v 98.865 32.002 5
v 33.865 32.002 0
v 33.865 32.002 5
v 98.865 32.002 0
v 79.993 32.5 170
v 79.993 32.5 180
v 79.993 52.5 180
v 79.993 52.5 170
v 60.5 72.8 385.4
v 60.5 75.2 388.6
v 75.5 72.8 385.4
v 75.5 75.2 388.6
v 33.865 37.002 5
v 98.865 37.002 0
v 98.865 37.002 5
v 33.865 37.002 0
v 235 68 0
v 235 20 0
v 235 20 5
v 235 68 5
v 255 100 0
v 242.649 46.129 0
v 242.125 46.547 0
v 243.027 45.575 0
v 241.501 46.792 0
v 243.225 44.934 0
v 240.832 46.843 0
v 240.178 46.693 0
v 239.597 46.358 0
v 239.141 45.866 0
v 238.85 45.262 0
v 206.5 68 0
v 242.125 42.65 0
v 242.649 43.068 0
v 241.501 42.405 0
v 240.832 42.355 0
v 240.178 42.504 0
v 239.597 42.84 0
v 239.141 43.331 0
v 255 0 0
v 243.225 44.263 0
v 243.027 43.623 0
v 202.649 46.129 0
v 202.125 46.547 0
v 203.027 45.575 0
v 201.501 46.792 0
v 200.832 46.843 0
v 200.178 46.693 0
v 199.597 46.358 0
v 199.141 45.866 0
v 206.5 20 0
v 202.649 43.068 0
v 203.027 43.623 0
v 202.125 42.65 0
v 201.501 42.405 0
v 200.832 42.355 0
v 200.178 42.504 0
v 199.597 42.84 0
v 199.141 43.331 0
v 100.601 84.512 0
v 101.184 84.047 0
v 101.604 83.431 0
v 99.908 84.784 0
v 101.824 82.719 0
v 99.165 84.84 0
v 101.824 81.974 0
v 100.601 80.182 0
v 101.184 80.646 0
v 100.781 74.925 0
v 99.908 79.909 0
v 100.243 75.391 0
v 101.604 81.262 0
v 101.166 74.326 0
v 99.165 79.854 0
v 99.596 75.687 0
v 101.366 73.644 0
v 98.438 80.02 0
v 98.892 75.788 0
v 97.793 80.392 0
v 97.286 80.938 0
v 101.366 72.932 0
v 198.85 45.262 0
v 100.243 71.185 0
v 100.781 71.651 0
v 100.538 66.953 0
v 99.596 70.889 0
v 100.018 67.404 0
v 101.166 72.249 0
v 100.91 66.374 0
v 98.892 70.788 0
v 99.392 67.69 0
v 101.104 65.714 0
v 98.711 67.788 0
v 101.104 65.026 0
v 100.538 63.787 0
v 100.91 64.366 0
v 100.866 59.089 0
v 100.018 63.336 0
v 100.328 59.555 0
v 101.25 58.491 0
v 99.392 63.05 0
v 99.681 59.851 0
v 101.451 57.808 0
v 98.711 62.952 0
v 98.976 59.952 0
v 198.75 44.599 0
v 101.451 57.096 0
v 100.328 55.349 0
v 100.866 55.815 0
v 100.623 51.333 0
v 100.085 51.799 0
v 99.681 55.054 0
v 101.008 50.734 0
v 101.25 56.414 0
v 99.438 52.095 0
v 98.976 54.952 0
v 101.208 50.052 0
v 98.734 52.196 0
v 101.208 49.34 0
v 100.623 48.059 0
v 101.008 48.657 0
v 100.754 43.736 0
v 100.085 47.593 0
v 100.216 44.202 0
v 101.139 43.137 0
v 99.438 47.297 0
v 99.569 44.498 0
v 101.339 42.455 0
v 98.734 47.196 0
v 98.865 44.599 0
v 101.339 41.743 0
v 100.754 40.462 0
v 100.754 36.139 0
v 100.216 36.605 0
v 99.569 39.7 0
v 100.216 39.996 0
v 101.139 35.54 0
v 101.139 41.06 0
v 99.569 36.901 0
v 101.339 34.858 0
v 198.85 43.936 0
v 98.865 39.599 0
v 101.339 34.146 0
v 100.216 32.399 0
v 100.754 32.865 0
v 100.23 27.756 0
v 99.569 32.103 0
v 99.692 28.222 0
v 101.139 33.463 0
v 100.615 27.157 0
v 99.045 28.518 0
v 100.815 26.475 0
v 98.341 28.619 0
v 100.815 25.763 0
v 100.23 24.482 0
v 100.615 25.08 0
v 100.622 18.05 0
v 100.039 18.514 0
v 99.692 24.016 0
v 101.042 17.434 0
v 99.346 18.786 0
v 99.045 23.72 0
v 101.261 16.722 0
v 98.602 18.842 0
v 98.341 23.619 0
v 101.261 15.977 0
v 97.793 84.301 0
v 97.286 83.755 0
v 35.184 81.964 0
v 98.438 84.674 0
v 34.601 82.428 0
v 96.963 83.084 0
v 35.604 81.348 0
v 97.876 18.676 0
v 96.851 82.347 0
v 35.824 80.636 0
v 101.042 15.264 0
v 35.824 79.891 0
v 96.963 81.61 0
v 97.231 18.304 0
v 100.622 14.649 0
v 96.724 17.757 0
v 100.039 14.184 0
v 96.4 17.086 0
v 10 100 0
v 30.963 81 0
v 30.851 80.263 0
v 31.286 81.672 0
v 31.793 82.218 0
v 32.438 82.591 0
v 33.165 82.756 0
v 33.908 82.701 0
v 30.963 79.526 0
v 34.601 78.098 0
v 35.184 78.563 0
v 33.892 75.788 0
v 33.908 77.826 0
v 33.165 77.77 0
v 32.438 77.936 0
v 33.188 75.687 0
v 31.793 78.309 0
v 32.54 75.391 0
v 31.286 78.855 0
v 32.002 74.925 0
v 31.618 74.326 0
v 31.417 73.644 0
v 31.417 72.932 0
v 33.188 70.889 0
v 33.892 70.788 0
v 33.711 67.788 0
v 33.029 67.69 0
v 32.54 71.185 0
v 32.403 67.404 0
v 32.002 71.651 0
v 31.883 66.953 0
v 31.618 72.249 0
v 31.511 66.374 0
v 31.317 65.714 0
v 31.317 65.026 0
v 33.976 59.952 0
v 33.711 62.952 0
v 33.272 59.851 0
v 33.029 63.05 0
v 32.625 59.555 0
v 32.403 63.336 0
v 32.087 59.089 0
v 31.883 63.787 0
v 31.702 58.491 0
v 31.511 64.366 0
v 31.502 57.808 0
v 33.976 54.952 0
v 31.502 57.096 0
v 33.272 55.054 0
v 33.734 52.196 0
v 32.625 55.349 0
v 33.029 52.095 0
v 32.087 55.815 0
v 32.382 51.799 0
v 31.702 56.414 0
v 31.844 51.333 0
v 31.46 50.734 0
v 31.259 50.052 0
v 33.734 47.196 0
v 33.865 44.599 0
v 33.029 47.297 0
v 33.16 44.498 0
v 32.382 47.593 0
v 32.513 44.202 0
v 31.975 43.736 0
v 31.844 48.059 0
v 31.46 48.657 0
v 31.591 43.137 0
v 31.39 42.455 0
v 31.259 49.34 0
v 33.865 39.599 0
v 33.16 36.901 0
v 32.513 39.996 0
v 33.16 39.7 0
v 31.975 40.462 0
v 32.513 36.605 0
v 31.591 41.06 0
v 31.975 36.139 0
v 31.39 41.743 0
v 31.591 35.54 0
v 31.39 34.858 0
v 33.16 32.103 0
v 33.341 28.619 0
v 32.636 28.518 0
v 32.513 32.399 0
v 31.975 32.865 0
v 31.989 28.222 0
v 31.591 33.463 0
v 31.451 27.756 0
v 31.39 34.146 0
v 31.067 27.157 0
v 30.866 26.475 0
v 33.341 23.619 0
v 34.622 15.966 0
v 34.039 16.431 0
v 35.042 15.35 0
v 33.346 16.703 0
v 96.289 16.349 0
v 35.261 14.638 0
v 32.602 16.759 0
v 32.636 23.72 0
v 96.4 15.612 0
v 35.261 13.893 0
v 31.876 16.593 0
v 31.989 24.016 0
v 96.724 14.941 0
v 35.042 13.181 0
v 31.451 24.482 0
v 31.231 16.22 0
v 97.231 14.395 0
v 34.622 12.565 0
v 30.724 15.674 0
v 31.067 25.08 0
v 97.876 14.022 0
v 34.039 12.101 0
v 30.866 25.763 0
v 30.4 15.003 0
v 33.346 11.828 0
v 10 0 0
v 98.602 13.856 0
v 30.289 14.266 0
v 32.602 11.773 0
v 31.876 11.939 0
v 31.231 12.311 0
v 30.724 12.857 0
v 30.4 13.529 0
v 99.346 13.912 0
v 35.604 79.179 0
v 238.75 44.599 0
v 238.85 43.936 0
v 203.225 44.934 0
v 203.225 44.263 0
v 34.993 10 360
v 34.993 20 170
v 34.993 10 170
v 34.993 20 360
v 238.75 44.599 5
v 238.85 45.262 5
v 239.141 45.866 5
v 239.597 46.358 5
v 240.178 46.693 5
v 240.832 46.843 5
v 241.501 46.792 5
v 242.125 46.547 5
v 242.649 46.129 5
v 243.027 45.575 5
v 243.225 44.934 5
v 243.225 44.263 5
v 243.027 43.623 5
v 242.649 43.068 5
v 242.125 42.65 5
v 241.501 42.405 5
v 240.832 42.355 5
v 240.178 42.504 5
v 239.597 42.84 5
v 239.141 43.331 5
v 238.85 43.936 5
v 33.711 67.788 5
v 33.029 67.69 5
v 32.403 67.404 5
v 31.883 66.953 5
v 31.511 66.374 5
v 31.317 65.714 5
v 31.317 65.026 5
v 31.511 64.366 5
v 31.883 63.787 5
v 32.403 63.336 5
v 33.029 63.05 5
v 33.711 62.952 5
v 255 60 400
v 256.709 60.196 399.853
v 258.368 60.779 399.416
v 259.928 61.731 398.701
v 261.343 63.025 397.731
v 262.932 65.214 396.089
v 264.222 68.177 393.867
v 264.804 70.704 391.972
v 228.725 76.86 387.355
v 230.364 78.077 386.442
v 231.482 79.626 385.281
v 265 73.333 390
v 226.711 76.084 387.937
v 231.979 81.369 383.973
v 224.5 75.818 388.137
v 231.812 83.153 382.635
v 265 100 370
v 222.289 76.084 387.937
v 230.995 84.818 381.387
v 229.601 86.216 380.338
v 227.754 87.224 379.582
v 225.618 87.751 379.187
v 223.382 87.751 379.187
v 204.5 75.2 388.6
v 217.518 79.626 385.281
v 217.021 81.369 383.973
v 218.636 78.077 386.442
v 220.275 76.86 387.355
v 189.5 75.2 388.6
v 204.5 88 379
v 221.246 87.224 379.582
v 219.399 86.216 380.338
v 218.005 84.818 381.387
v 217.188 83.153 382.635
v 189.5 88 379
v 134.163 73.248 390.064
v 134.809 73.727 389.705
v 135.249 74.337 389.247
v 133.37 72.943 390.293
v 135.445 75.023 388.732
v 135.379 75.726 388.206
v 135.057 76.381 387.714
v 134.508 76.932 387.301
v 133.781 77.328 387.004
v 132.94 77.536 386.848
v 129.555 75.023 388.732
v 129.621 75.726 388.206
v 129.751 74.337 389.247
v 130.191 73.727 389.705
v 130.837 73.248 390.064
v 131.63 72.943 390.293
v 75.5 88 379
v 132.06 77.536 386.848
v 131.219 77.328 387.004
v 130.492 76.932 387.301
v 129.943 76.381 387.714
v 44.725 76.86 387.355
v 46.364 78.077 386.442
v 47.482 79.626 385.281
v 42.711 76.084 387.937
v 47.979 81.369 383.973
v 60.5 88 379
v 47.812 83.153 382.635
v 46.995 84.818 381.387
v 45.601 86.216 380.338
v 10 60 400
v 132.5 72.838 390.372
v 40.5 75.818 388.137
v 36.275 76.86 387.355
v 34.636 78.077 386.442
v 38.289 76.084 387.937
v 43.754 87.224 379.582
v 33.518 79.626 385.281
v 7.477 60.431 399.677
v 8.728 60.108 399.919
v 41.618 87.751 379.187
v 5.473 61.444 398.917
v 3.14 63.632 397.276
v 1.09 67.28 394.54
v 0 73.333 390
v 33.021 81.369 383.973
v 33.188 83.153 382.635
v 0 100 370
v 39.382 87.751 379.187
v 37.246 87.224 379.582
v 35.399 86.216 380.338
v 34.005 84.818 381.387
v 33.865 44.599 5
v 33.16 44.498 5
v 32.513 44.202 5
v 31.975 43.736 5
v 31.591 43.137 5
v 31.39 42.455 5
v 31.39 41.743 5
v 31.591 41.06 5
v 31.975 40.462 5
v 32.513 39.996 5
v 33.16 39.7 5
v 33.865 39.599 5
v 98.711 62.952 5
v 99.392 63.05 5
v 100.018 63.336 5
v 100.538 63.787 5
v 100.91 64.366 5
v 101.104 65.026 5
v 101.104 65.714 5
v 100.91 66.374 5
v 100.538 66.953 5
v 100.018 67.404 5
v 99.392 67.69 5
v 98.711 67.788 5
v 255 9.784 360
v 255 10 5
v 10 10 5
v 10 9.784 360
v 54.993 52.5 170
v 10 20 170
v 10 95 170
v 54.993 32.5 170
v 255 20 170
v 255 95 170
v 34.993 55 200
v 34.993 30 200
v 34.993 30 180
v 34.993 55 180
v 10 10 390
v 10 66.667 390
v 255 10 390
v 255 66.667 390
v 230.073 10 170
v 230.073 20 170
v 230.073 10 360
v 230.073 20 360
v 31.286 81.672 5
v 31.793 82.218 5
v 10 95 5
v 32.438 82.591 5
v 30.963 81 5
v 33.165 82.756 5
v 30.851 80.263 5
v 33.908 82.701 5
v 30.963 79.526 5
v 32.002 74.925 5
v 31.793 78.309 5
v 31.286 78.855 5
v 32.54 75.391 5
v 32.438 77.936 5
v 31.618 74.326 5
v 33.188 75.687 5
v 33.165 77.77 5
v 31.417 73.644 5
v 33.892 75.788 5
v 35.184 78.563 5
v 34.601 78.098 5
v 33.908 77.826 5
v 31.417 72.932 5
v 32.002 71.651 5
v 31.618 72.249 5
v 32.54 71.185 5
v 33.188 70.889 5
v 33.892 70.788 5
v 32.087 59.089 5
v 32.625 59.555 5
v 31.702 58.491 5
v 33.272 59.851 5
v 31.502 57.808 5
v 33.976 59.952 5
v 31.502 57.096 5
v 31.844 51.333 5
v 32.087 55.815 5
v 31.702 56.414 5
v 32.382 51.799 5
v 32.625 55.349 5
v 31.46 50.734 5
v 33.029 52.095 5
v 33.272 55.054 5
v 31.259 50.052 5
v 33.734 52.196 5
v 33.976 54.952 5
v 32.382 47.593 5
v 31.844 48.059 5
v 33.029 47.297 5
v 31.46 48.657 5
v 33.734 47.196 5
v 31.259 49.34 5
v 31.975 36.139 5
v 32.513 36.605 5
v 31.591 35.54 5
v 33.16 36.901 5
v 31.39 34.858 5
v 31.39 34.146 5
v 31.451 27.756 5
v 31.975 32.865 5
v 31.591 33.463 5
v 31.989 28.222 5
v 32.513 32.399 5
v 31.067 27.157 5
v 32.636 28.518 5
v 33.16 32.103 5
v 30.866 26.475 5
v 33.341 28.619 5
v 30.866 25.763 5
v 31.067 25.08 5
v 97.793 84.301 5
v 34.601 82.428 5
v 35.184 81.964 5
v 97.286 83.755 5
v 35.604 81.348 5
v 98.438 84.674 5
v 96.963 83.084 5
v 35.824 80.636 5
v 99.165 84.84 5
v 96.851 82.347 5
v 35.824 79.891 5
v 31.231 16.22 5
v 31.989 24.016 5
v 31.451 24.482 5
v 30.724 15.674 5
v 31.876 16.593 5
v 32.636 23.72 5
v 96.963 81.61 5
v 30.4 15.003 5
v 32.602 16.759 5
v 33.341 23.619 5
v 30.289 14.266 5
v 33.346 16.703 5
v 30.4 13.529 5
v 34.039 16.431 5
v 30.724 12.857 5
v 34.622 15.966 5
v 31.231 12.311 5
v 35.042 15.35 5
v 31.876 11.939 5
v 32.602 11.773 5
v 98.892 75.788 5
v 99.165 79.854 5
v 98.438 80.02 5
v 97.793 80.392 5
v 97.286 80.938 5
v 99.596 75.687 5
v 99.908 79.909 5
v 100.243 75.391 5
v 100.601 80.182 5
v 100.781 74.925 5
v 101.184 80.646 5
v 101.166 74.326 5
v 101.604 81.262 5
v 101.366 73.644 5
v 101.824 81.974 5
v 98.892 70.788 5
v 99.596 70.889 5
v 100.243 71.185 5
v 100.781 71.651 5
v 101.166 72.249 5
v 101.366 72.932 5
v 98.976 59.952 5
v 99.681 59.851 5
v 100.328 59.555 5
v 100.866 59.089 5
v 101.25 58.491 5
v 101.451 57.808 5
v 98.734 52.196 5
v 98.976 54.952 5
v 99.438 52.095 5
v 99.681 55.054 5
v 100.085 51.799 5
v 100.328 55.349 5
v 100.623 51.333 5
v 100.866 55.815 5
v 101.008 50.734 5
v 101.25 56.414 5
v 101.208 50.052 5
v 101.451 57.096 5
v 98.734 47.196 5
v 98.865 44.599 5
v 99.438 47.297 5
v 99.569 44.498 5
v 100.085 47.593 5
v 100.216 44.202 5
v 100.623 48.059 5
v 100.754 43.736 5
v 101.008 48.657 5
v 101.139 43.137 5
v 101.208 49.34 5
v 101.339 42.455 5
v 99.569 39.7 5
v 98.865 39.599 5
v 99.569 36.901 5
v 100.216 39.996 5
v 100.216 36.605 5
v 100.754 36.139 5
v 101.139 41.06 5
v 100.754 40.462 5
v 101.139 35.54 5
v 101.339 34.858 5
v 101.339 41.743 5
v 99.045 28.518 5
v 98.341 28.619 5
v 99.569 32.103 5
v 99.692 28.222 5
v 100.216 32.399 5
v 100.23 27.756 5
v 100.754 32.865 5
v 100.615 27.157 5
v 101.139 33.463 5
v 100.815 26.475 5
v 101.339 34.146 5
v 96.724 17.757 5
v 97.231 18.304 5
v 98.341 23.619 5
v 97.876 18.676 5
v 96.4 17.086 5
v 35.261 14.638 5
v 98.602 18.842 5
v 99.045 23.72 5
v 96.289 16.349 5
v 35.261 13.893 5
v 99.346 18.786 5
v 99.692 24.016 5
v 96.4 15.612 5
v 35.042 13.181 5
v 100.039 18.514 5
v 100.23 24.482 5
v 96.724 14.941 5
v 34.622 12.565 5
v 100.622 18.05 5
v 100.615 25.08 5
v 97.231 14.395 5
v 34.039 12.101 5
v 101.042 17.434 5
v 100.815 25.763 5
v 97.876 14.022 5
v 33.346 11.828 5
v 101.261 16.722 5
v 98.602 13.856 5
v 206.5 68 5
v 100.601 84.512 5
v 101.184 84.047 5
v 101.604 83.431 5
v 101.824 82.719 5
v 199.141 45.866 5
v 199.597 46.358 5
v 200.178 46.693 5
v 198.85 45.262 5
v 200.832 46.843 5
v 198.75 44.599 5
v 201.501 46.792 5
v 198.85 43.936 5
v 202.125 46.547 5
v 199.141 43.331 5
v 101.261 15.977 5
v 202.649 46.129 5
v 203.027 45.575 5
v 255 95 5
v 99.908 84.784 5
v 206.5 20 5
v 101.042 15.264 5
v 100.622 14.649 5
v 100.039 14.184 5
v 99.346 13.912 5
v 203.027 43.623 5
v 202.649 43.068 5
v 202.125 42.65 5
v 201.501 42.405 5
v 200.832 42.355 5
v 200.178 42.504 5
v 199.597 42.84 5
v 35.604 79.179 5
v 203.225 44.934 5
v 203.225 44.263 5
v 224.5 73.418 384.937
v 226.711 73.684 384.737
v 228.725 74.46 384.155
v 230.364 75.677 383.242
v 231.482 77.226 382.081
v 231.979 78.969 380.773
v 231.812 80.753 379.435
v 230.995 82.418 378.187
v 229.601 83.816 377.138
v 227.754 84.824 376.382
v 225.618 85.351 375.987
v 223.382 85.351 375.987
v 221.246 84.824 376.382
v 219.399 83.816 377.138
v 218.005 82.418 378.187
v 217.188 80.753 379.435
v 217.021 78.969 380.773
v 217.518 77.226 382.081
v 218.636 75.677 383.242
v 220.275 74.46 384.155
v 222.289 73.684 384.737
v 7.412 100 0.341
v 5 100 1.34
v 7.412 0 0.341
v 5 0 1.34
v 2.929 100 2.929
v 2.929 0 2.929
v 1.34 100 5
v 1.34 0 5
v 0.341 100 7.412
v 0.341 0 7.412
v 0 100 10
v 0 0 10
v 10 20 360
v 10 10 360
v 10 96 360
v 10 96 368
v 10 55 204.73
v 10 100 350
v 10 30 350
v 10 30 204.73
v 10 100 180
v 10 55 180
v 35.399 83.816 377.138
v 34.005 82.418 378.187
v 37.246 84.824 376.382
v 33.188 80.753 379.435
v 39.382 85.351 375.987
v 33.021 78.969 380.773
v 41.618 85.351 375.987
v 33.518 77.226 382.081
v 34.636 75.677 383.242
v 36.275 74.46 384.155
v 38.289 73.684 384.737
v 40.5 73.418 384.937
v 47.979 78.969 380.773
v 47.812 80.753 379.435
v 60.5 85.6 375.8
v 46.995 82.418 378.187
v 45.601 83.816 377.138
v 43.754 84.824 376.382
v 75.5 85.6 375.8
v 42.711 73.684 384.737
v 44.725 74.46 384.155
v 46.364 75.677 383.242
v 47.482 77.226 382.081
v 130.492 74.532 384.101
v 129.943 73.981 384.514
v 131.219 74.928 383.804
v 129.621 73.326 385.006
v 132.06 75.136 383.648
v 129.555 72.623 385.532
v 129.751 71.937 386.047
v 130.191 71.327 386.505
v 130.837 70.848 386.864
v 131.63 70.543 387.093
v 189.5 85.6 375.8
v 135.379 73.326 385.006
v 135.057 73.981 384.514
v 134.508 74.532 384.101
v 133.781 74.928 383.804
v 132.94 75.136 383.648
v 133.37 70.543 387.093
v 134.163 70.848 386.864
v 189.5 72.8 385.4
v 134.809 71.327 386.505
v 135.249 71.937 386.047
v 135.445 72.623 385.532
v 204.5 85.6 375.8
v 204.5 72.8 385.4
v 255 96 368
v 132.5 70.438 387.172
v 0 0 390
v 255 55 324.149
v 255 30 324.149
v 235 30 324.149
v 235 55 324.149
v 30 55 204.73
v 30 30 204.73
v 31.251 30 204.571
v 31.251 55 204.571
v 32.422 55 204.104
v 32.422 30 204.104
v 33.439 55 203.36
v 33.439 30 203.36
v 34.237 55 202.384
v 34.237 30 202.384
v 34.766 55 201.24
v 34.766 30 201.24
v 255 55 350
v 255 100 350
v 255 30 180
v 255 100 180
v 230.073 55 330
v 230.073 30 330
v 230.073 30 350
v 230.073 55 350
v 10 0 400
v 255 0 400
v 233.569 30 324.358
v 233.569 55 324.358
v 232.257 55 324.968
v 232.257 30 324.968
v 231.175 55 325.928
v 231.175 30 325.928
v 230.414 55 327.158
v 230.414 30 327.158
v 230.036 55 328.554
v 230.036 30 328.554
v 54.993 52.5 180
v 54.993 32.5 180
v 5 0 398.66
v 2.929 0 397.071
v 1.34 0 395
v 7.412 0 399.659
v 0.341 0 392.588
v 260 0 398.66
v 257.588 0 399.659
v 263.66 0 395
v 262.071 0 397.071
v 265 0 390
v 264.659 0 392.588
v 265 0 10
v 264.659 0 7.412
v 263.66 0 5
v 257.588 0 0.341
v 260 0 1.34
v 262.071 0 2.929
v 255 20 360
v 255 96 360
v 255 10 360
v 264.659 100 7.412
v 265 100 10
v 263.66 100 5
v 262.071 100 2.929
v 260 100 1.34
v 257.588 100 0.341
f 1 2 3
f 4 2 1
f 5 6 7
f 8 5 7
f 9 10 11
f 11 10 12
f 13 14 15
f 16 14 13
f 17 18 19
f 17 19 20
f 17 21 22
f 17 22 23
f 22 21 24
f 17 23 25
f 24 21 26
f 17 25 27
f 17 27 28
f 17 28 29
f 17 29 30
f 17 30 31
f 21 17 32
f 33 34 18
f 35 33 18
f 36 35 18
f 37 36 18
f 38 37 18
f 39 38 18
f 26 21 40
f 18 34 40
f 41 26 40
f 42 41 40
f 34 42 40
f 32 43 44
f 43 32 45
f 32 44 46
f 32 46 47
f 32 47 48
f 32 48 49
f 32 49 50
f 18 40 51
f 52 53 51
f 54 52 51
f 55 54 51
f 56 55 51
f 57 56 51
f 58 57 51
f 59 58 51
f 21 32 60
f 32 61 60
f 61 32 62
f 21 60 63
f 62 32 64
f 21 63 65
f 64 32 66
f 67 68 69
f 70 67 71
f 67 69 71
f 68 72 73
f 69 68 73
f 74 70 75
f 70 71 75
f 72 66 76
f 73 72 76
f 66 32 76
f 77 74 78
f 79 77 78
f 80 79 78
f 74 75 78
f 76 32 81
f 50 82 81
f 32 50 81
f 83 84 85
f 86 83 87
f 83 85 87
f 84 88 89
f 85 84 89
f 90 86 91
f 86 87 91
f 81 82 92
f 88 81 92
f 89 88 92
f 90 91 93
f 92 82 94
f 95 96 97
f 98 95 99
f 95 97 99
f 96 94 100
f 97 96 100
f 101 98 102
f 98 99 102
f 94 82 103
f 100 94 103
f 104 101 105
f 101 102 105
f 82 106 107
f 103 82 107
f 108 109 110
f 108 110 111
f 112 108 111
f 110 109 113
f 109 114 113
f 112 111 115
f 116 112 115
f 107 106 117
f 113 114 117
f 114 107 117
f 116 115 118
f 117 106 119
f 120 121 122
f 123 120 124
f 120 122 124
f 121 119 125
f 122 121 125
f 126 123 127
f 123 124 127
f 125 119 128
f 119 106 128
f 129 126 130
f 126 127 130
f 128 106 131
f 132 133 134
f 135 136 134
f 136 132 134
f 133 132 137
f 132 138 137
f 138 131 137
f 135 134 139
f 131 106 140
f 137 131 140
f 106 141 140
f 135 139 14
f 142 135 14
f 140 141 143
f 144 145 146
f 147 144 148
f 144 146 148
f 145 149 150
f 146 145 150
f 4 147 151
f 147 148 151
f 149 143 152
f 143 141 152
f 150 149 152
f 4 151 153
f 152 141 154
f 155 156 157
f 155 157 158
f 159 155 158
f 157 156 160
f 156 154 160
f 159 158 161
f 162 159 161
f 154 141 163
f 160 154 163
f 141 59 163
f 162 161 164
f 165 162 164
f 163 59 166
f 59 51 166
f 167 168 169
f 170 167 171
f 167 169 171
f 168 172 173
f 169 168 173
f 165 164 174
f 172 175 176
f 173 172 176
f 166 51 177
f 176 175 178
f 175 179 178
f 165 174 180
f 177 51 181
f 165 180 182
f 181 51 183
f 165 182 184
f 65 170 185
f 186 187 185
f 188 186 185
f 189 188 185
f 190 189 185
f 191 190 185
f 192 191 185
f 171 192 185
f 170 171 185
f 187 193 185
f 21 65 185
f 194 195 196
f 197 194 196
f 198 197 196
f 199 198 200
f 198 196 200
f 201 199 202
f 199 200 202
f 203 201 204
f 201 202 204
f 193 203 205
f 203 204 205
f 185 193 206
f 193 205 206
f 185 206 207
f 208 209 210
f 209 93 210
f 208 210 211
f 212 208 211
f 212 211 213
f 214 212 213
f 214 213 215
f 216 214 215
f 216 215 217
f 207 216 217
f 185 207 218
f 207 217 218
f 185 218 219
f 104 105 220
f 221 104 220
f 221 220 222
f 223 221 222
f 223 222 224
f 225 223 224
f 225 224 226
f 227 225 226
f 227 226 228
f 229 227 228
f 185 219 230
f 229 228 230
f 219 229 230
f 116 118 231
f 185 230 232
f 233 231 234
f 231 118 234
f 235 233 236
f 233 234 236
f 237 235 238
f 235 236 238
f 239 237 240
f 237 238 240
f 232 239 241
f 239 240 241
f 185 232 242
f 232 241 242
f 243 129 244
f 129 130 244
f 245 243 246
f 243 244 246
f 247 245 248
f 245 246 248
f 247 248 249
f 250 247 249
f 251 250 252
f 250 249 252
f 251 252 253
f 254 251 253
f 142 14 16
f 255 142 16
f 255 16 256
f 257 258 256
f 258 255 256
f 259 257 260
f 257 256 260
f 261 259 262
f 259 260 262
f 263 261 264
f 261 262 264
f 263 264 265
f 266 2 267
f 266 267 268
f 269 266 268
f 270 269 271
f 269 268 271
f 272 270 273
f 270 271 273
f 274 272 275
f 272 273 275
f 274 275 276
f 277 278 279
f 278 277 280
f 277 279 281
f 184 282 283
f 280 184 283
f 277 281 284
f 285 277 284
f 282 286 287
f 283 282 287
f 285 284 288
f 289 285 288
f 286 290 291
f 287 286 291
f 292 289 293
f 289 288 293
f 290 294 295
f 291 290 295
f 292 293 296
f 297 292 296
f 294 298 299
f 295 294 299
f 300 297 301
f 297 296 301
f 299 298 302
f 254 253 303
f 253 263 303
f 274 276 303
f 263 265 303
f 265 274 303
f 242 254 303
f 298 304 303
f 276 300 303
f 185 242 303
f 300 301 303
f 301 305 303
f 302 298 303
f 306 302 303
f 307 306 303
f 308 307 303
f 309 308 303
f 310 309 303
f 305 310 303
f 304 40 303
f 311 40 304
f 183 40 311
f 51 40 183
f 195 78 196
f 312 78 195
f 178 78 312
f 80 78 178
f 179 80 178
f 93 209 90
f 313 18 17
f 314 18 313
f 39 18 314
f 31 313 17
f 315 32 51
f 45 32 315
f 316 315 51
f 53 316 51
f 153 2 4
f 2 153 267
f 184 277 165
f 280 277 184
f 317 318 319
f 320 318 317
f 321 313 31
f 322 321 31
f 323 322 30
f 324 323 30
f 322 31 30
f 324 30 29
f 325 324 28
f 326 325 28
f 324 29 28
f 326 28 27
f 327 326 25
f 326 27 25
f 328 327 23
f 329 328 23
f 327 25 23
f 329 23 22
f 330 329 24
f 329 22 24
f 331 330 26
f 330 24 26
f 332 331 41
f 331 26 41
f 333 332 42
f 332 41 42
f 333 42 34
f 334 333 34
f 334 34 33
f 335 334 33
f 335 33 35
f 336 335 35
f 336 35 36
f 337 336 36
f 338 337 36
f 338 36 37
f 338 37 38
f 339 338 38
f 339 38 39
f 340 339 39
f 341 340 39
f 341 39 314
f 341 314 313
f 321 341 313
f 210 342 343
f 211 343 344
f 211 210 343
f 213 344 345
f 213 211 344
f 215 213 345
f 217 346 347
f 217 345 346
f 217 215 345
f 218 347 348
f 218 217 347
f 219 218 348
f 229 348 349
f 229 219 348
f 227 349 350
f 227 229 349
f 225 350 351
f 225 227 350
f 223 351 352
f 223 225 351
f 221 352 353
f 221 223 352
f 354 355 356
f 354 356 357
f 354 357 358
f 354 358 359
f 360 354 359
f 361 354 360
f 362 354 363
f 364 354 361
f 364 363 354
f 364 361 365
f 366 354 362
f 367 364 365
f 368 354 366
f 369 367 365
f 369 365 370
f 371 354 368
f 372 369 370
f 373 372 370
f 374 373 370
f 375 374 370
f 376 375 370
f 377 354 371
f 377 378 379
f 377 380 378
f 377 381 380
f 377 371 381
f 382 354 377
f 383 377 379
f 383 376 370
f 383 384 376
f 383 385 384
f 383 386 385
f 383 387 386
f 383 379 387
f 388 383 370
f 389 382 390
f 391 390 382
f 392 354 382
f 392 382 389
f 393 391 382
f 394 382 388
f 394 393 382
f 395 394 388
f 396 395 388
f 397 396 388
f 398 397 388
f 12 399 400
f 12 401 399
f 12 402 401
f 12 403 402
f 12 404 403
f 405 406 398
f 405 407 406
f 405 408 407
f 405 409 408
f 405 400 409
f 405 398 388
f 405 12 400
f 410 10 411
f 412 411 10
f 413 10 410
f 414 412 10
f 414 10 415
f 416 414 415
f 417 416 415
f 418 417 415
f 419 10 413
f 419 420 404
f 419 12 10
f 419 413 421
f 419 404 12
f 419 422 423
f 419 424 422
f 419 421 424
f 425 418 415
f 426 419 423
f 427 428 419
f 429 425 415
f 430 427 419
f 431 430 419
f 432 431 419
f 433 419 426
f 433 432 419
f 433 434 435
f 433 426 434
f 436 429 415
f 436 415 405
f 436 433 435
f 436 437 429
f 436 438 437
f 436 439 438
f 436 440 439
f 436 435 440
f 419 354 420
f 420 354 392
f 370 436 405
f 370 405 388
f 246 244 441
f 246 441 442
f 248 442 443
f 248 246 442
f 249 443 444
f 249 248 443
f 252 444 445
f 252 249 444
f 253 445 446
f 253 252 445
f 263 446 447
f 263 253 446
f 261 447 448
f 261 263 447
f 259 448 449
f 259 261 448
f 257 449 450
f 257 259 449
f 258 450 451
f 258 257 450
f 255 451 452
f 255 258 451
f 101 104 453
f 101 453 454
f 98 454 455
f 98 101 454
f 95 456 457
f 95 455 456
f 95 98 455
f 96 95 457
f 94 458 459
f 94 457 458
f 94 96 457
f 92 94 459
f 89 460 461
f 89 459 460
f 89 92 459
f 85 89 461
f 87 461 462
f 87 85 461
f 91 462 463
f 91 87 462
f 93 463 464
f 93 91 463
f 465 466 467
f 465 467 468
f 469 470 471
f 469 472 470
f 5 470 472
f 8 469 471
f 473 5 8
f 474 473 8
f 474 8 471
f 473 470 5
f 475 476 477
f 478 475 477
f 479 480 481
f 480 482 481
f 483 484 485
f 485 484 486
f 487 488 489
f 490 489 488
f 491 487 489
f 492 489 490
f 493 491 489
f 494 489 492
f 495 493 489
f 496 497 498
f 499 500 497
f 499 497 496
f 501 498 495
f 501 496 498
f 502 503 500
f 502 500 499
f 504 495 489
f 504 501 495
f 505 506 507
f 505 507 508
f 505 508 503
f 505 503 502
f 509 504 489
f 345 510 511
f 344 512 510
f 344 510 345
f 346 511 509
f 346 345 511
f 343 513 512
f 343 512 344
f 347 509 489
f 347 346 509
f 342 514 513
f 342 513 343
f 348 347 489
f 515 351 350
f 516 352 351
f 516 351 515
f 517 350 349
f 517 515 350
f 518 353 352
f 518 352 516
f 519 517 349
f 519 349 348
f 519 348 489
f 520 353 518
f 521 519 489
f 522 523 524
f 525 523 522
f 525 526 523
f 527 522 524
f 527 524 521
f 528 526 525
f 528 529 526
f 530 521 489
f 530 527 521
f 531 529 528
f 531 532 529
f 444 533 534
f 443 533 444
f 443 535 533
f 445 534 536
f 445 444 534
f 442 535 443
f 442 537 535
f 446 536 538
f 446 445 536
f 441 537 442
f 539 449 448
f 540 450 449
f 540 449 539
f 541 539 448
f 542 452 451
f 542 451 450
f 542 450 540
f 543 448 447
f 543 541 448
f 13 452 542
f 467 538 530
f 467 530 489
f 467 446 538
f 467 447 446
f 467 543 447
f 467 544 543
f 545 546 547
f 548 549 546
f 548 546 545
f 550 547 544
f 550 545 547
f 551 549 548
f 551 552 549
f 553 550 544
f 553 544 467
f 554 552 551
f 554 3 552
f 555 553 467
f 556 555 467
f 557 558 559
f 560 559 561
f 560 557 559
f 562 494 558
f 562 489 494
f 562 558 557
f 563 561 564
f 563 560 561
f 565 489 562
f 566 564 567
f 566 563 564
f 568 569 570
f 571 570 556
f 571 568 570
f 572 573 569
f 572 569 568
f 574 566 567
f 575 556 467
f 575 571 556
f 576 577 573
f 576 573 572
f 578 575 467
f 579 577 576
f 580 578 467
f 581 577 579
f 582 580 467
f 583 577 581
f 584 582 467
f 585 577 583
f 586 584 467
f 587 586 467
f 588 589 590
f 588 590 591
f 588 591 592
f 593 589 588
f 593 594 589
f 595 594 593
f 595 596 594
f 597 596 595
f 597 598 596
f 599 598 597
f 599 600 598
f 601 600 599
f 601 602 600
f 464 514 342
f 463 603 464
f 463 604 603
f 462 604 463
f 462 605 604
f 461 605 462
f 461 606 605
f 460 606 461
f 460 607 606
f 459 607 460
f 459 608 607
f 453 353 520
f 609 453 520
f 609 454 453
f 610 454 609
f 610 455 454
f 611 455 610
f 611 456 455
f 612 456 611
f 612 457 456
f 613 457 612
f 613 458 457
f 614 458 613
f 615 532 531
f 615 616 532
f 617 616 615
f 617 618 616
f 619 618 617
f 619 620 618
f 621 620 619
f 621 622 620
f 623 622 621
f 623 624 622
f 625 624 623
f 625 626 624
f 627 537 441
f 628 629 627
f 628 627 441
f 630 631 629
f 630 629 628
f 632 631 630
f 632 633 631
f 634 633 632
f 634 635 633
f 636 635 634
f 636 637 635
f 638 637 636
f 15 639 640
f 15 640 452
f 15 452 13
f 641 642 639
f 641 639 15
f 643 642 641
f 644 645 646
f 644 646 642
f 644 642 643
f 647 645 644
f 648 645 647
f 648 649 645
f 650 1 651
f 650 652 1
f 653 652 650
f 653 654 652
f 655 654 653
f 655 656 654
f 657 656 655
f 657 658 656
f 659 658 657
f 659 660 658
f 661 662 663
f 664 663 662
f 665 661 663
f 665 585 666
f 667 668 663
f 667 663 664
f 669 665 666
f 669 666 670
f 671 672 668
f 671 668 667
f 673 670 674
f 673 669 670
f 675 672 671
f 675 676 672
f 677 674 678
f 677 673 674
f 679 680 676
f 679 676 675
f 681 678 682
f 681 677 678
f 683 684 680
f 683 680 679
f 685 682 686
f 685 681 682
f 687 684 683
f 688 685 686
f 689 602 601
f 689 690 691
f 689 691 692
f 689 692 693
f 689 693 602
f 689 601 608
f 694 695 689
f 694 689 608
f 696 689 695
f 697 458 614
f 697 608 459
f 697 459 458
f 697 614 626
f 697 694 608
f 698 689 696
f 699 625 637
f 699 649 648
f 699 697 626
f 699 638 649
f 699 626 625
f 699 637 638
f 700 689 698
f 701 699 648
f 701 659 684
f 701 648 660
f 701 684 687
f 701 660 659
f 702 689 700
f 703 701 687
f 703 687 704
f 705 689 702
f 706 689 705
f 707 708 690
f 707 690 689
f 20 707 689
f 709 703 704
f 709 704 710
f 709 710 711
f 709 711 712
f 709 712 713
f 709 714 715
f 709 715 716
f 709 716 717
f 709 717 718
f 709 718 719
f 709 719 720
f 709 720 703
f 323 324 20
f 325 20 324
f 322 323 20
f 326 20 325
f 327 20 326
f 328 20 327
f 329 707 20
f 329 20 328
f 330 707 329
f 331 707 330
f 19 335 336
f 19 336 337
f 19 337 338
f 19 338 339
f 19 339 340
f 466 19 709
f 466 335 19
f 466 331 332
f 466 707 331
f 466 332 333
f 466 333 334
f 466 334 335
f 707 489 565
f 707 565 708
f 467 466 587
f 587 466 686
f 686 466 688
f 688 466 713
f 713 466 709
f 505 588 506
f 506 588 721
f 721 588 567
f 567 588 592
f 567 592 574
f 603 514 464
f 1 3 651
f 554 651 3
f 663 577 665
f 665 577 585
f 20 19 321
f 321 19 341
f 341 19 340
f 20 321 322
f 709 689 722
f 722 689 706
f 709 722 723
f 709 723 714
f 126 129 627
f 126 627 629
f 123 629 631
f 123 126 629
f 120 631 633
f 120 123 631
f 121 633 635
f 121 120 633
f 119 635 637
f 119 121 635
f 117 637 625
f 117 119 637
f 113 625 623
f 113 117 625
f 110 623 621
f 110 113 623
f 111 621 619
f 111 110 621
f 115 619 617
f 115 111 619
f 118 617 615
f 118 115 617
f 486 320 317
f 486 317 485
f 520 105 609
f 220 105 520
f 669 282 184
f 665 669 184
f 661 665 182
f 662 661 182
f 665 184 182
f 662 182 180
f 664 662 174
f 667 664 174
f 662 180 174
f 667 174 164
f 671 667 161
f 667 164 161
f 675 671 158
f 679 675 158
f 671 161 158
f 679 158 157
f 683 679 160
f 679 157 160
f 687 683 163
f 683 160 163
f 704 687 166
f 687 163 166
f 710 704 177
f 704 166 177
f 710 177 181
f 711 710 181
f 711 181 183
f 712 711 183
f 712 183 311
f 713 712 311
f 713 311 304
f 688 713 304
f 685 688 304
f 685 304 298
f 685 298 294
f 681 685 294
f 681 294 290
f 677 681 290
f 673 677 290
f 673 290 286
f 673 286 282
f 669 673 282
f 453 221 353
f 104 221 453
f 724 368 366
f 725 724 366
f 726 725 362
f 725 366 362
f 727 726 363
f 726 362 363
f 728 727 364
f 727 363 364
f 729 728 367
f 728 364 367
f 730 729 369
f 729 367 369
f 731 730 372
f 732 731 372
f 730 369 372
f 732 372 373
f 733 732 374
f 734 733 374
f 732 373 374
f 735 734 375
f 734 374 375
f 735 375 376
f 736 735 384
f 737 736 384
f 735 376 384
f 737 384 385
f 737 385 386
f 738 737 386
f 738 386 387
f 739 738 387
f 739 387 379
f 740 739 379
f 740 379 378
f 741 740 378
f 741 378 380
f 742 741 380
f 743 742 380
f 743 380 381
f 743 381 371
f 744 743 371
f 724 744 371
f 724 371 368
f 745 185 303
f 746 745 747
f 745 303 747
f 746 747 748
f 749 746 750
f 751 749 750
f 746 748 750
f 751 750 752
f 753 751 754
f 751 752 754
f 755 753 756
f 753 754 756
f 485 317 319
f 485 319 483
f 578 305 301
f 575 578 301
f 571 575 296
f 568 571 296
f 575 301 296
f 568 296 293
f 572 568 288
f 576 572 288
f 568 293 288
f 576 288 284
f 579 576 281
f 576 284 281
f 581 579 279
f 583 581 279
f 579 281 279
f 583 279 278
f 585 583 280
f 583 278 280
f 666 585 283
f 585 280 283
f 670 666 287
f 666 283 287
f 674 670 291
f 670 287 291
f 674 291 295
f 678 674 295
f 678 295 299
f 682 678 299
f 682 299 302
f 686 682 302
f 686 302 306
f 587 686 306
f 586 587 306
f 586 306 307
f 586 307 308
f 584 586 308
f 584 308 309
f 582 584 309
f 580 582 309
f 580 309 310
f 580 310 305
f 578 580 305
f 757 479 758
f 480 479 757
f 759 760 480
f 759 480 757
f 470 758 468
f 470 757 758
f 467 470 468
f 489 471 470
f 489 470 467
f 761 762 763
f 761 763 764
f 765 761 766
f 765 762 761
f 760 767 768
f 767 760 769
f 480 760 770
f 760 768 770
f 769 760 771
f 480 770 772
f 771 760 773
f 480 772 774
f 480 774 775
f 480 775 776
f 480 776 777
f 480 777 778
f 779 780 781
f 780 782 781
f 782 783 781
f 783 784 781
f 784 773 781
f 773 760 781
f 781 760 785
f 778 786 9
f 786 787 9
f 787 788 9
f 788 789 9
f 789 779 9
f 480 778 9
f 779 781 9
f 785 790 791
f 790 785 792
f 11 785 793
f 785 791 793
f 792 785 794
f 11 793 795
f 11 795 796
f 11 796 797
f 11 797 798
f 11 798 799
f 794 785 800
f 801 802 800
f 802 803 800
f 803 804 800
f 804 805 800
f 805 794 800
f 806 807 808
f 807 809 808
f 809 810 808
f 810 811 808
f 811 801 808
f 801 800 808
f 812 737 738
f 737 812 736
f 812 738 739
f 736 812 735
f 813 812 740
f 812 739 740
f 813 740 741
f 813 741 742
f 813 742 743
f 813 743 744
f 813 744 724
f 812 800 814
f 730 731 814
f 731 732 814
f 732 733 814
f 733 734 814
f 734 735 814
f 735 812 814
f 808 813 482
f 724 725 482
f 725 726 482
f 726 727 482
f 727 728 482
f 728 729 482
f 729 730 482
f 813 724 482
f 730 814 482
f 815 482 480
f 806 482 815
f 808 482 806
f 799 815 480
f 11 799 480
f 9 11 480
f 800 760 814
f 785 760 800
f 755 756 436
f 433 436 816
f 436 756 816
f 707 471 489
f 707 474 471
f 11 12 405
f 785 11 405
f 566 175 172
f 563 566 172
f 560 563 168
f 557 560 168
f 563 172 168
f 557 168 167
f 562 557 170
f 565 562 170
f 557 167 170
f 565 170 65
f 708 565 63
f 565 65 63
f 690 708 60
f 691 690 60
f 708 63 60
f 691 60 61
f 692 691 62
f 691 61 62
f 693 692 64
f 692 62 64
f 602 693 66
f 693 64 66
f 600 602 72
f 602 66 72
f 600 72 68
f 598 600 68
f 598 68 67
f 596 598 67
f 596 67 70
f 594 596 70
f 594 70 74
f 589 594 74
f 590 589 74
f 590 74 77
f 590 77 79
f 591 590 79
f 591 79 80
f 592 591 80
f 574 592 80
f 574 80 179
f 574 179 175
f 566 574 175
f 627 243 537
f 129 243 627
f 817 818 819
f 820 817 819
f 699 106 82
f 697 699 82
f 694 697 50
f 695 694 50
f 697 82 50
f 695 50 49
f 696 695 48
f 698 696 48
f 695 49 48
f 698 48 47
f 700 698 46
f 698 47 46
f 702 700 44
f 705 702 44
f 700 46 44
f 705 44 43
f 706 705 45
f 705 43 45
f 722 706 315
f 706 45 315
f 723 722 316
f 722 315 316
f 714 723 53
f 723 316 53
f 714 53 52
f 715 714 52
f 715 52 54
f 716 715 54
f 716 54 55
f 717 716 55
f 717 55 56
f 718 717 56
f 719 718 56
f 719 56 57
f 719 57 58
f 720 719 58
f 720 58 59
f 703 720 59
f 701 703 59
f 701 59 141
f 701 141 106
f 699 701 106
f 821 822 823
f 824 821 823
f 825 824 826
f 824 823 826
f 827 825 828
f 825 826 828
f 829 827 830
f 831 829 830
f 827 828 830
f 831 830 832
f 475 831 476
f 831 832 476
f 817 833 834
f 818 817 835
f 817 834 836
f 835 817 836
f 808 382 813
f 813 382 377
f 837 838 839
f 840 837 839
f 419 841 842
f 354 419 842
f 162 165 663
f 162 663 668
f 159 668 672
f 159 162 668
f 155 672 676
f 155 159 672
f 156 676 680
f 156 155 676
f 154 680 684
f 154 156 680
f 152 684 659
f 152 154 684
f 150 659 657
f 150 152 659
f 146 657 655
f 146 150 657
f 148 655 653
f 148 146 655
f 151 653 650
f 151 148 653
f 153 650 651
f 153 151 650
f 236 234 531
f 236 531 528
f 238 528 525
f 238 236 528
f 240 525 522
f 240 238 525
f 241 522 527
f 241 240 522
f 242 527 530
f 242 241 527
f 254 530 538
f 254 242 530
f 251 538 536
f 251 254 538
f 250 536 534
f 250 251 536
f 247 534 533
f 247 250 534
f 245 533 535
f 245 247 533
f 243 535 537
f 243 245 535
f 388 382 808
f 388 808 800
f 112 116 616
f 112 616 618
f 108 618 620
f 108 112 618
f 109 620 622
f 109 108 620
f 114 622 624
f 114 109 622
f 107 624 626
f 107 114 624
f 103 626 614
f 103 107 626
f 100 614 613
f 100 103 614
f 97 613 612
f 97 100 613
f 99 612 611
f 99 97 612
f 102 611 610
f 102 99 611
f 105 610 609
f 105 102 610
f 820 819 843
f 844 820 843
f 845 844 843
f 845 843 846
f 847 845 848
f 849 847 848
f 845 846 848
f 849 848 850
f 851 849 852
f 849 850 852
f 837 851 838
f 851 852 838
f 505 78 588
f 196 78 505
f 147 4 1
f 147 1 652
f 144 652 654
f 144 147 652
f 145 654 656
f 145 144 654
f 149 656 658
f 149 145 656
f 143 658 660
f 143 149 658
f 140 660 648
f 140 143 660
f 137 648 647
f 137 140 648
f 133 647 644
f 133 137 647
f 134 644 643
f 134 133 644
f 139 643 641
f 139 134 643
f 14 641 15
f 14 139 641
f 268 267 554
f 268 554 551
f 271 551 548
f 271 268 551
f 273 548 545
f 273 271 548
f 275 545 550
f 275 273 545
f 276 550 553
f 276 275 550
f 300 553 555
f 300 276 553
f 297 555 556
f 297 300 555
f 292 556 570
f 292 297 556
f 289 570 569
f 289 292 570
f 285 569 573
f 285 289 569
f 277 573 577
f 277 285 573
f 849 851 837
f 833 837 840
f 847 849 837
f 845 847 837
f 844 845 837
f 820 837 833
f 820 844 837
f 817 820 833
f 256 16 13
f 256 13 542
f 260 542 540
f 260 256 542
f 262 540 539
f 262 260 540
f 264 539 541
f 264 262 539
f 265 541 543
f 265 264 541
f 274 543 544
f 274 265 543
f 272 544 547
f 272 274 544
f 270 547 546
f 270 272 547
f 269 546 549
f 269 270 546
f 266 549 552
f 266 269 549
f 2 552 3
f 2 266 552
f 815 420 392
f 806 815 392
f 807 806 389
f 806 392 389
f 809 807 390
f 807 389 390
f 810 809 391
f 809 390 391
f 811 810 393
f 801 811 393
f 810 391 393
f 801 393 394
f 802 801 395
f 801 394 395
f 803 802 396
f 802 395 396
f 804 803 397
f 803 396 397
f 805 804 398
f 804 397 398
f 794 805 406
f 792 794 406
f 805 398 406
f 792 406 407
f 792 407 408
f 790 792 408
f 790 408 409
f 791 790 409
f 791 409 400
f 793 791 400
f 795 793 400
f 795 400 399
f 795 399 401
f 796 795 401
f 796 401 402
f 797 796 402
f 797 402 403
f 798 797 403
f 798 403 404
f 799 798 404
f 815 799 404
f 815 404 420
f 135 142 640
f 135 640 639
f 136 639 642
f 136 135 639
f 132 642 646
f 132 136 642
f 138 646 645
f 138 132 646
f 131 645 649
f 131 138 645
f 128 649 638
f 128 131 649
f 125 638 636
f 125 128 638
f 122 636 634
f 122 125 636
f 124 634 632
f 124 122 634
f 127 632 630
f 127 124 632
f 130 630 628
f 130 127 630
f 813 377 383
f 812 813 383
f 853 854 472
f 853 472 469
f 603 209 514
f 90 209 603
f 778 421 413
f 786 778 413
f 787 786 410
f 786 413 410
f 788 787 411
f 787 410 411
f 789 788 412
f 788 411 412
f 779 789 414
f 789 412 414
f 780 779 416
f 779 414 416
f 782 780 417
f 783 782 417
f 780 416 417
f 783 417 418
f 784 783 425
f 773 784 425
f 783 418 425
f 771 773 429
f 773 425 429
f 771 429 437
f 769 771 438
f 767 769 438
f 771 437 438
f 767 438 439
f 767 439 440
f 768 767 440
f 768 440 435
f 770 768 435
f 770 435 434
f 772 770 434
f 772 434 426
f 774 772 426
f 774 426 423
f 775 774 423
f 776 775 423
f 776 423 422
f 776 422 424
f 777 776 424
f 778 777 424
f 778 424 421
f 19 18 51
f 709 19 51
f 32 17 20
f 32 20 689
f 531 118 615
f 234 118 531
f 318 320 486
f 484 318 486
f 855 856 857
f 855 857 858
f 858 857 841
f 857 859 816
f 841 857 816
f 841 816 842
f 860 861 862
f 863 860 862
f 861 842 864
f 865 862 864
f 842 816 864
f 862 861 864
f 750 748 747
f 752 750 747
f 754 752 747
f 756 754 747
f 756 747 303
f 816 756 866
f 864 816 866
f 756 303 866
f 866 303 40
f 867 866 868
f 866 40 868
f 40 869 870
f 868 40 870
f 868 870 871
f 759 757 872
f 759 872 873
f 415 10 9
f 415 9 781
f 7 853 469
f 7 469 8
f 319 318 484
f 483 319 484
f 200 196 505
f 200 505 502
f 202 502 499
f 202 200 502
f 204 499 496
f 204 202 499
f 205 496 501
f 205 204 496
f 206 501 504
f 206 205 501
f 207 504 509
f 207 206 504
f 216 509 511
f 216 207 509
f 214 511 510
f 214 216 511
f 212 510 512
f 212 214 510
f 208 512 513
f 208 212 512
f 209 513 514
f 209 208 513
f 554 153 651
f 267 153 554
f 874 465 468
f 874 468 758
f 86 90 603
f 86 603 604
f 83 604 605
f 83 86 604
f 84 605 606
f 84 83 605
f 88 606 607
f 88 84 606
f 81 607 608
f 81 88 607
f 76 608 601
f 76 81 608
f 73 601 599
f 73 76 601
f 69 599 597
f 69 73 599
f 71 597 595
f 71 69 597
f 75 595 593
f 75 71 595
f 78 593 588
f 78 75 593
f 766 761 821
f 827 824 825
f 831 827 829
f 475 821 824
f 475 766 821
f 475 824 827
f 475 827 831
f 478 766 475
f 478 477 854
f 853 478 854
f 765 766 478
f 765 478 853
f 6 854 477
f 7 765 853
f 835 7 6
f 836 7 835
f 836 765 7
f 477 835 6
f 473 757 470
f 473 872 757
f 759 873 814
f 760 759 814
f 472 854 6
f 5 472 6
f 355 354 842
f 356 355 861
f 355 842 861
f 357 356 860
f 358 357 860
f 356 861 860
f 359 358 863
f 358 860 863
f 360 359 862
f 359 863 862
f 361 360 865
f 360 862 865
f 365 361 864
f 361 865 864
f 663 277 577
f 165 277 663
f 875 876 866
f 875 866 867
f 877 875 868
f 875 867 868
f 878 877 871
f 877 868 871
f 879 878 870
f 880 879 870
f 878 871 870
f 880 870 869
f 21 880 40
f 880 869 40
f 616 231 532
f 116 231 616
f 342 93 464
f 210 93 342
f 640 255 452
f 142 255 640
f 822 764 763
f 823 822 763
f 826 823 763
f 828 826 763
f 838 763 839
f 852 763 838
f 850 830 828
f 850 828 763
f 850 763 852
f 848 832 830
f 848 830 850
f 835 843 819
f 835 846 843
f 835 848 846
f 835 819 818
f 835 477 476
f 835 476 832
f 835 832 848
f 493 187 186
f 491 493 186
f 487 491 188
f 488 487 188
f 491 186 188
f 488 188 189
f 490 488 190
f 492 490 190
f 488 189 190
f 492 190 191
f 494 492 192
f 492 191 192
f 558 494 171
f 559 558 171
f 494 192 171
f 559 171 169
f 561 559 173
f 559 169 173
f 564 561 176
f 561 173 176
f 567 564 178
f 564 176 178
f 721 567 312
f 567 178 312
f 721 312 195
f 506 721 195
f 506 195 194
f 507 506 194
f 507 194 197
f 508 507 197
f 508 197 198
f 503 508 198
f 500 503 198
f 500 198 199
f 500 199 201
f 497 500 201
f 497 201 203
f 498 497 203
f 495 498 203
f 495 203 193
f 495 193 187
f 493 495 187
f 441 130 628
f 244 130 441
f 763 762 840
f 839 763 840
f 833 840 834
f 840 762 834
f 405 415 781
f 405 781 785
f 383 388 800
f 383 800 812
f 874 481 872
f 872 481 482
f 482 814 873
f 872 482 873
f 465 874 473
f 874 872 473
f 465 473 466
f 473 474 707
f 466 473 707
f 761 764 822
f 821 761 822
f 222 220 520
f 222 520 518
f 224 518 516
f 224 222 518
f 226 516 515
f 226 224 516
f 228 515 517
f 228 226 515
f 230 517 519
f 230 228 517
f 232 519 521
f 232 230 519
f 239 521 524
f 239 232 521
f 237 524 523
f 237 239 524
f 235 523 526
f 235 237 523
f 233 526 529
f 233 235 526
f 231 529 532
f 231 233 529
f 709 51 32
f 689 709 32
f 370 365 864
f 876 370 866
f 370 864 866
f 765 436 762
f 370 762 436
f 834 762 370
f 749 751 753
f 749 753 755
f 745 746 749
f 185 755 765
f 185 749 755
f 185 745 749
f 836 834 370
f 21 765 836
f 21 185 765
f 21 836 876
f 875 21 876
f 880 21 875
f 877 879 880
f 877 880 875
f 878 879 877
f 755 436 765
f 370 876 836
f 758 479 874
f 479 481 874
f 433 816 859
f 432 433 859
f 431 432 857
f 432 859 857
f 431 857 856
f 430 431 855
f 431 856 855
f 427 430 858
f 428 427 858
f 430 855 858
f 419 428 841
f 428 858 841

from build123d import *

# Parameters (mm, degrees)
BOSS_EXTRUDE2_DEPTH      = 100
SKETCH4_W                = 245
SKETCH4_H                = 170
CUT_EXTRUDE2_DEPTH       = 70
CUT_EXTRUDE12_DEPTH      = 434.077648927
CUT_EXTRUDE12_DEPTH_BACK = 434.077648927
CUT_EXTRUDE13_DEPTH      = 122.5
CUT_EXTRUDE14_DEPTH      = 122.5
SKETCH16_R               = 2.5
SKETCH16_R_2             = 2.25
SKETCH16_W               = 28.5
SKETCH16_H               = 48
CUT_EXTRUDE15_DEPTH      = 30
SKETCH17_R               = 2.952889484
SKETCH17_R_2             = 7.5
SKETCH17_W               = 15
SKETCH17_H               = 16
CUT_EXTRUDE16_DEPTH      = 10
BOSS_EXTRUDE3_DEPTH      = 25
SKETCH19_W               = 25
SKETCH19_H               = 20
CUT_EXTRUDE17_DEPTH      = 15
SKETCH21_W               = 195.080232819
SKETCH21_H               = 190
BOSS_EXTRUDE9_DEPTH      = 10


with BuildPart() as part:
    # Sketch1 → Boss-Extrude2 (new body)
    with BuildSketch(Plane(origin=(0, 0, 0), x_dir=(1, 0, 0), z_dir=(0, 1, 0))):
        with BuildLine():
            Line((0, -10), (0, -390))
            ThreePointArc((0, -390), (2.928932188, -397.071067812), (10, -400))
            Line((10, -400), (255, -400))
            ThreePointArc((255, -400), (262.071067812, -397.071067812), (265, -390))
            Line((265, -390), (265, -10))
            ThreePointArc((265, -10), (262.071067812, -2.928932188), (255, 0))
            Line((255, 0), (10, 0))
            ThreePointArc((10, 0), (2.928932188, -2.928932188), (0, -10))
        make_face()
    extrude(amount=BOSS_EXTRUDE2_DEPTH)

    # Sketch4 → Cut-Extrude2 (cut)
    with BuildSketch(Plane(origin=(0, 100, 0), x_dir=(1, 0, 0), z_dir=(0, 1, 0))):
        with Locations((132.5, -265)):
            Rectangle(SKETCH4_W, SKETCH4_H)
    extrude(amount=-CUT_EXTRUDE2_DEPTH, mode=Mode.SUBTRACT)

    # Sketch10 → Cut-Extrude12 (cut, two sides: drawn at the far end of the back side and taken through both)
    with BuildSketch(Plane(origin=(132.5, 0, 0), x_dir=(0, 0, -1), z_dir=(1, 0, 0)).offset(-CUT_EXTRUDE12_DEPTH_BACK)):
        Polygon((-400, 60), (-370, 100), (-400, 100), align=None)
    extrude(amount=CUT_EXTRUDE12_DEPTH + CUT_EXTRUDE12_DEPTH_BACK, mode=Mode.SUBTRACT)

    # Sketch14 → Cut-Extrude13 (cut, symmetric)
    with BuildSketch(Plane(origin=(132.5, 0, 0), x_dir=(0, 0, -1), z_dir=(1, 0, 0))):
        Polygon((-390, 10), (-360, 10), (-360, 96), (-368, 96), (-390, 66.666666667), align=None)
    extrude(amount=CUT_EXTRUDE13_DEPTH, both=True, mode=Mode.SUBTRACT)

    # Sketch15 → Cut-Extrude14 (cut, symmetric)
    with BuildSketch(Plane(origin=(132.5, 0, 0), x_dir=(0, 0, -1), z_dir=(1, 0, 0))):
        Polygon((-360, 9.784104138), (-360, 20), (-170, 20), (-170, 95), (-5, 95), (-5, 10), align=None)
    extrude(amount=CUT_EXTRUDE14_DEPTH, both=True, mode=Mode.SUBTRACT)

    # Sketch16 → Cut-Extrude15 (cut)
    with BuildSketch(Plane(origin=(0, 0, 0), x_dir=(-1, 0, 0), z_dir=(0, 0, -1))):
        with Locations((-99.351479045, 82.346777086)):
            Circle(SKETCH16_R)
        with Locations((-32.789304606, 14.265780679)):
            Circle(SKETCH16_R)
        with Locations((-33.351479045, 80.263386392)):
            Circle(SKETCH16_R)
        with Locations((-98.789304606, 16.349171373)):
            Circle(SKETCH16_R)
        with Locations((-241, 44.598834986)):
            Circle(SKETCH16_R_2)
        with Locations((-201, 44.598834986)):
            Circle(SKETCH16_R_2)
        with BuildLine():
            Line((-98.891846609, 75.787809753), (-33.891846609, 75.787809753))
            ThreePointArc((-33.891846609, 75.787809753), (-31.391846609, 73.287809753), (-33.891846609, 70.787809753))
            Line((-33.891846609, 70.787809753), (-98.891846609, 70.787809753))
            ThreePointArc((-98.891846609, 70.787809753), (-101.391846609, 73.287809753), (-98.891846609, 75.787809753))
        make_face()
        with BuildLine():
            Line((-98.710582977, 67.787809753), (-33.710582977, 67.787809753))
            ThreePointArc((-33.710582977, 67.787809753), (-31.292813717, 65.370040492), (-33.710582977, 62.952271231))
            Line((-33.710582977, 62.952271231), (-98.710582977, 62.952271231))
            ThreePointArc((-98.710582977, 62.952271231), (-101.128352238, 65.370040492), (-98.710582977, 67.787809753))
        make_face()
        with BuildLine():
            Line((-98.976192668, 59.952271231), (-33.976192668, 59.952271231))
            ThreePointArc((-33.976192668, 59.952271231), (-31.476192668, 57.452271231), (-33.976192668, 54.952271231))
            Line((-33.976192668, 54.952271231), (-98.976192668, 54.952271231))
            ThreePointArc((-98.976192668, 54.952271231), (-101.476192668, 57.452271231), (-98.976192668, 59.952271231))
        make_face()
        with BuildLine():
            Line((-98.733660424, 52.195845601), (-33.733660424, 52.195845601))
            ThreePointArc((-33.733660424, 52.195845601), (-31.233660424, 49.695845601), (-33.733660424, 47.195845601))
            Line((-33.733660424, 47.195845601), (-98.733660424, 47.195845601))
            ThreePointArc((-98.733660424, 47.195845601), (-101.233660424, 49.695845601), (-98.733660424, 52.195845601))
        make_face()
        with BuildLine():
            Line((-98.864643365, 44.598834986), (-33.864643365, 44.598834986))
            ThreePointArc((-33.864643365, 44.598834986), (-31.364643365, 42.098834986), (-33.864643365, 39.598834986))
            Line((-33.864643365, 39.598834986), (-98.864643365, 39.598834986))
            ThreePointArc((-98.864643365, 39.598834986), (-101.364643365, 42.098834986), (-98.864643365, 44.598834986))
        make_face()
        with BuildLine():
            Line((-98.864643365, 37.00182437), (-33.864643365, 37.00182437))
            ThreePointArc((-33.864643365, 37.00182437), (-31.364643365, 34.50182437), (-33.864643365, 32.00182437))
            Line((-33.864643365, 32.00182437), (-98.864643365, 32.00182437))
            ThreePointArc((-98.864643365, 32.00182437), (-101.364643365, 34.50182437), (-98.864643365, 37.00182437))
        make_face()
        with BuildLine():
            Line((-98.340711599, 28.618916104), (-33.340711599, 28.618916104))
            ThreePointArc((-33.340711599, 28.618916104), (-30.840711599, 26.118916104), (-33.340711599, 23.618916104))
            Line((-33.340711599, 23.618916104), (-98.340711599, 23.618916104))
            ThreePointArc((-98.340711599, 23.618916104), (-100.840711599, 26.118916104), (-98.340711599, 28.618916104))
        make_face()
        with Locations((-220.75, 44)):
            Rectangle(SKETCH16_W, SKETCH16_H)
    extrude(amount=-CUT_EXTRUDE15_DEPTH, mode=Mode.SUBTRACT)

    # Sketch17 → Cut-Extrude16 (cut)
    with BuildSketch(Plane(origin=(0, 213.6, 284.8), x_dir=(1, 0, 0), z_dir=(0, 0.5999999999999998, 0.8000000000000004))):
        with Locations(Location((132.5, -173, 0), (0, 0, 270))):
            Circle(SKETCH17_R)
        with Locations(Location((40.5, -164.727732251, 0), (0, 0, 270))):
            Circle(SKETCH17_R_2)
        with Locations(Location((224.5, -164.727732251, 0), (0, 0, 270))):
            Circle(SKETCH17_R_2)
        with Locations((68, -165)):
            Rectangle(SKETCH17_W, SKETCH17_H)
        with Locations((197, -165)):
            Rectangle(SKETCH17_W, SKETCH17_H)
    extrude(amount=-CUT_EXTRUDE16_DEPTH, mode=Mode.SUBTRACT)

    # Sketch18 → Boss-Extrude3 (add)
    with BuildSketch(Plane(origin=(0, 30, 0), x_dir=(1, 0, 0), z_dir=(0, 1, 0))):
        with BuildLine():
            Line((10, -180), (10, -204.729927007))
            Line((10, -204.729927007), (30, -204.729927007))
            ThreePointArc((30, -204.729927007), (33.43872324, -203.359690427), (34.99270073, -200))
            Line((34.99270073, -200), (34.99270073, -180))
            Line((34.99270073, -180), (10, -180))
        make_face()
        with BuildLine():
            Line((255, -350), (255, -324.14910859))
            Line((255, -324.14910859), (235, -324.14910859))
            ThreePointArc((235, -324.14910859), (231.175444009, -325.928429861), (230.072933549, -330))
            Line((230.072933549, -330), (230.072933549, -350))
            Line((230.072933549, -350), (255, -350))
        make_face()
    extrude(amount=BOSS_EXTRUDE3_DEPTH)

    # Sketch19 → Cut-Extrude17 (cut)
    with BuildSketch(Plane.XY.offset(180)):
        with Locations((67.49270073, 42.5)):
            Rectangle(SKETCH19_W, SKETCH19_H)
    extrude(amount=-CUT_EXTRUDE17_DEPTH, mode=Mode.SUBTRACT)


with BuildPart() as body_2:
    # Sketch21 → Boss-Extrude9 (new body)
    with BuildSketch(Plane.XZ.offset(-20)):
        with Locations((132.53281714, 265)):
            Rectangle(SKETCH21_W, SKETCH21_H)
    extrude(amount=BOSS_EXTRUDE9_DEPTH)


solid = Compound([part.part, body_2.part])
